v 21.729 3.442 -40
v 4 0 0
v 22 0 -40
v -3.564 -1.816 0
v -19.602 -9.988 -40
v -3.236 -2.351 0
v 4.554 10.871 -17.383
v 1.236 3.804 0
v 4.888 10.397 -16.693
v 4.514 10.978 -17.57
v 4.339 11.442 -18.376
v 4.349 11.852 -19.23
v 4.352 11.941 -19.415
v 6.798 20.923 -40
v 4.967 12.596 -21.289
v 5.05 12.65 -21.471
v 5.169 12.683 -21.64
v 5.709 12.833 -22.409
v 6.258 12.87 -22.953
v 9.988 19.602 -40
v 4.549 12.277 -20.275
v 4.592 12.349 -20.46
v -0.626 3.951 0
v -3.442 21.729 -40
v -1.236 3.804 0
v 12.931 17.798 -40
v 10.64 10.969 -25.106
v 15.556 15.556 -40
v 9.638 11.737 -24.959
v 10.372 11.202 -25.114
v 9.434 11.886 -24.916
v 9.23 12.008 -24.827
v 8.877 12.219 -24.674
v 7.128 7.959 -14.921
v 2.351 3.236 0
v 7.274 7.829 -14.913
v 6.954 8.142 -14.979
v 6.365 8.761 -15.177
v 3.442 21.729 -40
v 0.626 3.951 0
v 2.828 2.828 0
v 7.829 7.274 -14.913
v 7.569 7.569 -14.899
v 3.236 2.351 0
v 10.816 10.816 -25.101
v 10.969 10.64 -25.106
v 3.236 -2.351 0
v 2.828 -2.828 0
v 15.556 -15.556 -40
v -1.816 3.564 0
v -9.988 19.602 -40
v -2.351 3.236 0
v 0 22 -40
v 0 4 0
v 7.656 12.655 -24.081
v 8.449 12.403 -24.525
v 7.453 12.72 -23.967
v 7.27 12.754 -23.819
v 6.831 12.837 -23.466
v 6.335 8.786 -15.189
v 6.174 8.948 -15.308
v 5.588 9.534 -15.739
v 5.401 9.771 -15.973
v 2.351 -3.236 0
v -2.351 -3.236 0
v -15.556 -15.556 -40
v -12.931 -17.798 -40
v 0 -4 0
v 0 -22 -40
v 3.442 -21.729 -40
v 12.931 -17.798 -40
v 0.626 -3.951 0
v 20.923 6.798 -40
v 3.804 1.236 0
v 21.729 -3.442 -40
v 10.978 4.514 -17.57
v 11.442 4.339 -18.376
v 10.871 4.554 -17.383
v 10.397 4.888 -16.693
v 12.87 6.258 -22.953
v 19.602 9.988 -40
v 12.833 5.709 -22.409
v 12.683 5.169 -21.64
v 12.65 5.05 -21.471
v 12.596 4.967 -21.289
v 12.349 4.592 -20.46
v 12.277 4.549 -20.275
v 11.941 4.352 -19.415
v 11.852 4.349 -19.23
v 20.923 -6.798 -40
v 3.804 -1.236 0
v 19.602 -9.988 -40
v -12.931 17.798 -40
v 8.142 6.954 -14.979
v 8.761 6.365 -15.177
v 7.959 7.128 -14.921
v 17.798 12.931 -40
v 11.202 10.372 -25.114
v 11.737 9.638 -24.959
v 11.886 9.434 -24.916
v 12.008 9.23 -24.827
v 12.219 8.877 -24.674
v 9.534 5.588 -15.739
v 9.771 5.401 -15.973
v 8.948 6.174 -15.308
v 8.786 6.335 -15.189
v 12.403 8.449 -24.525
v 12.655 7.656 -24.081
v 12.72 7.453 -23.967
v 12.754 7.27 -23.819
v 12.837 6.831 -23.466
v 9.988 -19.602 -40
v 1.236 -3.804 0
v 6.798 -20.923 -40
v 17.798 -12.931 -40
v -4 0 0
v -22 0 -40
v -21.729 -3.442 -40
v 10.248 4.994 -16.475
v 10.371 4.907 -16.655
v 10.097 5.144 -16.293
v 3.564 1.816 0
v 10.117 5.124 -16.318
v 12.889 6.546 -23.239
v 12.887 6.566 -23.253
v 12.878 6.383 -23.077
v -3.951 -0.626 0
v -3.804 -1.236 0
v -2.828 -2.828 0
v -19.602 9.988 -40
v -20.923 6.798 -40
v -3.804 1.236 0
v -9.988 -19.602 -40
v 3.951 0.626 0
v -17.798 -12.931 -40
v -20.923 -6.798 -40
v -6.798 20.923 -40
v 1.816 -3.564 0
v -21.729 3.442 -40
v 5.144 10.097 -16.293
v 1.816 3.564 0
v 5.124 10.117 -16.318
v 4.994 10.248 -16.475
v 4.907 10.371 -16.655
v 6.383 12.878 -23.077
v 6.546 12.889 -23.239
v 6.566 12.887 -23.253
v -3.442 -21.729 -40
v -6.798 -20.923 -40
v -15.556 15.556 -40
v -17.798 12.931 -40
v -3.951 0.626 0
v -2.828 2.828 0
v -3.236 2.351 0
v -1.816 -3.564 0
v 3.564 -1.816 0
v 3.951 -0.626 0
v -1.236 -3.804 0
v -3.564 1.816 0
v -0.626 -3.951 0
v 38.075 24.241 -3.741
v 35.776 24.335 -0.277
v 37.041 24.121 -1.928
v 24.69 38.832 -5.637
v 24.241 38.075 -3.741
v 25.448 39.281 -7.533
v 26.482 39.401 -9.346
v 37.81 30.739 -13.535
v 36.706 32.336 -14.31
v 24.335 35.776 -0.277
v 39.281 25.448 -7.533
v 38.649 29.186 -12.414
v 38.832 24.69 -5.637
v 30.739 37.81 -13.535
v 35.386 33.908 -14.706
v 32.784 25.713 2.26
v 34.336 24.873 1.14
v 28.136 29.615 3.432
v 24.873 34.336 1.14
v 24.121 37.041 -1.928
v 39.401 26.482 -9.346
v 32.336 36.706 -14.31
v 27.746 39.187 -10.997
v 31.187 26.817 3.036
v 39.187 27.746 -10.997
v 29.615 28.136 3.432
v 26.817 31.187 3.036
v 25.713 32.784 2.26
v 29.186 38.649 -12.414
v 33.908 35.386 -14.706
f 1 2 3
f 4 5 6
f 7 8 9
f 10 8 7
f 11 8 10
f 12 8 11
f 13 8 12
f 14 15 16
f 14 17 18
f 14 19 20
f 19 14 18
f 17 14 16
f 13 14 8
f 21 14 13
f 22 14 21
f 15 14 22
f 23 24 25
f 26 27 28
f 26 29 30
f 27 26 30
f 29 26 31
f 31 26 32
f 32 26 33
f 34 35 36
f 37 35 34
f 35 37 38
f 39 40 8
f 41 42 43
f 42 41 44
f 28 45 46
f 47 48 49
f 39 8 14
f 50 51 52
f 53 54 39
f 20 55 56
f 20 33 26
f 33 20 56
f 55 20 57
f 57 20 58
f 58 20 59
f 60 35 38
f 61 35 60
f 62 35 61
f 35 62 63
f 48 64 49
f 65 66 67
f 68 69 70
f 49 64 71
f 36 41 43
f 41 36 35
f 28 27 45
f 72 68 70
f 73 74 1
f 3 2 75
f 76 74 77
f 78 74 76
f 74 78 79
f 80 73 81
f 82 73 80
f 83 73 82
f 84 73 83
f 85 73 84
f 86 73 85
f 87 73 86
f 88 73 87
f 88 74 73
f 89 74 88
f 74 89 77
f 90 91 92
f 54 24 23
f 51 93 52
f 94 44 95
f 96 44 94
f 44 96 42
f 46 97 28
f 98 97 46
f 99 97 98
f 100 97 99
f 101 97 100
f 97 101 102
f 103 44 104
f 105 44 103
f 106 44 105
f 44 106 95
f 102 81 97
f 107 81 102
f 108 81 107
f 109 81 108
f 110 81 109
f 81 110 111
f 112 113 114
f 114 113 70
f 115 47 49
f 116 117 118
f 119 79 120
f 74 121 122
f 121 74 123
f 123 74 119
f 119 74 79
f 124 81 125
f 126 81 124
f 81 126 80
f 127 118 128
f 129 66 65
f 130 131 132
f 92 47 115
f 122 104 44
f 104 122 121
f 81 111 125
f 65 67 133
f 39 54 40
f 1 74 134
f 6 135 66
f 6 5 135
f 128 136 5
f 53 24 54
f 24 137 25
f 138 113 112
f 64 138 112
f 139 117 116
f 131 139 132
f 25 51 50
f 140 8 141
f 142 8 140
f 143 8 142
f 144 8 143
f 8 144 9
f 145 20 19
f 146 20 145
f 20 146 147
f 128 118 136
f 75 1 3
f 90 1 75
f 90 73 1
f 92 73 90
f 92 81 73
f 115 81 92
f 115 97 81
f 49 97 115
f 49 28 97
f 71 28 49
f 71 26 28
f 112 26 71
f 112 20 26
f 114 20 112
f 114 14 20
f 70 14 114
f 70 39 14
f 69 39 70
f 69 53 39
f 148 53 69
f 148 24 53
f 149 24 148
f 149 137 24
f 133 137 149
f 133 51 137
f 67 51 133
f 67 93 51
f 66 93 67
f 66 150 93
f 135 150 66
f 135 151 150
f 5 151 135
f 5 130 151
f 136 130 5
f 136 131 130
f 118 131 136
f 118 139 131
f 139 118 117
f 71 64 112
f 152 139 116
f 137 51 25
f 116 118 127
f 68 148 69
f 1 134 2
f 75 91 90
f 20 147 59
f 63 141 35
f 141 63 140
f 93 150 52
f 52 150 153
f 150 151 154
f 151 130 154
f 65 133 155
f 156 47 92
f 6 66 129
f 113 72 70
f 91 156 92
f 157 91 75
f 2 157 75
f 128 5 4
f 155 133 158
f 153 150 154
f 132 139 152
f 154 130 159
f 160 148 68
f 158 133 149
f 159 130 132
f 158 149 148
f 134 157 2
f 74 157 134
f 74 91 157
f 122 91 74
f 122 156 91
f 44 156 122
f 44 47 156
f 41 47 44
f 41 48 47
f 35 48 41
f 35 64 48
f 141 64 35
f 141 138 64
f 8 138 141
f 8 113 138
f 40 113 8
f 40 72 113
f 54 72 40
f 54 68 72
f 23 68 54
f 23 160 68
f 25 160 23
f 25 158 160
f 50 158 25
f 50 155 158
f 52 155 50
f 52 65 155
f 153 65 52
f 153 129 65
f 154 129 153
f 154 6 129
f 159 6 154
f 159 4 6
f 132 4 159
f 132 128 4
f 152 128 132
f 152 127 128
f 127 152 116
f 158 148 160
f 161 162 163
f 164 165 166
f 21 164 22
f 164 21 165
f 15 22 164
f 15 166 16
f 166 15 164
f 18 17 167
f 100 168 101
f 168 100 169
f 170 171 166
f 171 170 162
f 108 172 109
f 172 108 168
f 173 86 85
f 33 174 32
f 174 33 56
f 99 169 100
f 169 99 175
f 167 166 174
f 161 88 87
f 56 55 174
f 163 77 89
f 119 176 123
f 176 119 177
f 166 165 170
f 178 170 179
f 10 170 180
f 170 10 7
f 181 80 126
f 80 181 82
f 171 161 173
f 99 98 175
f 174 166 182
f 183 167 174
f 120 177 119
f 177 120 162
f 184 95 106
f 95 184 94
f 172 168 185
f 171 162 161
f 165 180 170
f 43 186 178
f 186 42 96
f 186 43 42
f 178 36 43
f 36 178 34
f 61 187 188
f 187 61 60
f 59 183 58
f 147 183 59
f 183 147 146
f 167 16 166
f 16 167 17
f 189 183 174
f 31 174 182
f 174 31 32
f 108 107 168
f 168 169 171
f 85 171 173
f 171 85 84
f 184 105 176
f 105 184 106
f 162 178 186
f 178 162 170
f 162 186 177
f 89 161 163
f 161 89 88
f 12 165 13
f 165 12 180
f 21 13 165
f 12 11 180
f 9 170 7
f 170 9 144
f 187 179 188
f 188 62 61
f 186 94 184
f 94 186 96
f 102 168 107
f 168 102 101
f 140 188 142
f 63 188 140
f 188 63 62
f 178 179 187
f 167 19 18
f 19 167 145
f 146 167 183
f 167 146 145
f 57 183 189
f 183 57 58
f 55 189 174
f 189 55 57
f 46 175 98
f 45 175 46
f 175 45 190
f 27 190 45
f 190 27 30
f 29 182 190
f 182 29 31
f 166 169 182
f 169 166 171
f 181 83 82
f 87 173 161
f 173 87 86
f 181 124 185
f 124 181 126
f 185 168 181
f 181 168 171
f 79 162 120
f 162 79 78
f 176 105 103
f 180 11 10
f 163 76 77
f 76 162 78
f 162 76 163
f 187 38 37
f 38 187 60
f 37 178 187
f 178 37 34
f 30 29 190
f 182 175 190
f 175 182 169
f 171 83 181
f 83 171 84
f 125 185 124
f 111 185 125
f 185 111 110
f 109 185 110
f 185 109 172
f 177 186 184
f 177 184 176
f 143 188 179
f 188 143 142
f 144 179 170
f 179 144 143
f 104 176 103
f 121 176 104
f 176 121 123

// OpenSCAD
// Start: lazy_union
default_5_default_5();
// End: lazy_union

// Modules.

// 'PartMaterial undef-default - undef-default'
module default_5_default_5() {
  // 'None : _combine_solids_and_holes'
  union() {
    // 'cone1'
    multmatrix(m=[[1.0, 0.0, 0.0, 0.0], [0.0, 1.0, 0.0, 0.0], [0.0, 0.0, 1.0, -40.0], [0.0, 0.0, 0.0, 1.0]]) {
      // 'cone1'
      color(c=[0.1, 1.0, 0.0, 1.0]) {
        // 'cone1 : _combine_solids_and_holes'
        union() {
          // 'cone1'
          cylinder(h=40.0, r1=22.0, r2=4.0, center=false, $fn=40);
        }
      }
    }
    // 'cone2'
    multmatrix(m=[[-0.7071067811865476, 0.2901716460986225, -0.6448258802191611, 31.76129396309576], [0.7071067811865476, 0.2901716460986225, -0.6448258802191611, 31.76129396309576], [0.0, -0.9119215051751064, -0.4103646773287979, -5.637236293492073], [0.0, 0.0, 0.0, 1.0]]) {
      // 'cone2'
      color(c=[0.0, 1.0, 0.0, 1.0]) {
        // 'cone2 : _combine_solids_and_holes'
        union() {
          // 'cone2'
          cylinder(h=40.0, r1=10.0, r2=5.0, center=false);
        }
      }
    }
  }
} // end module default_5_default_5
